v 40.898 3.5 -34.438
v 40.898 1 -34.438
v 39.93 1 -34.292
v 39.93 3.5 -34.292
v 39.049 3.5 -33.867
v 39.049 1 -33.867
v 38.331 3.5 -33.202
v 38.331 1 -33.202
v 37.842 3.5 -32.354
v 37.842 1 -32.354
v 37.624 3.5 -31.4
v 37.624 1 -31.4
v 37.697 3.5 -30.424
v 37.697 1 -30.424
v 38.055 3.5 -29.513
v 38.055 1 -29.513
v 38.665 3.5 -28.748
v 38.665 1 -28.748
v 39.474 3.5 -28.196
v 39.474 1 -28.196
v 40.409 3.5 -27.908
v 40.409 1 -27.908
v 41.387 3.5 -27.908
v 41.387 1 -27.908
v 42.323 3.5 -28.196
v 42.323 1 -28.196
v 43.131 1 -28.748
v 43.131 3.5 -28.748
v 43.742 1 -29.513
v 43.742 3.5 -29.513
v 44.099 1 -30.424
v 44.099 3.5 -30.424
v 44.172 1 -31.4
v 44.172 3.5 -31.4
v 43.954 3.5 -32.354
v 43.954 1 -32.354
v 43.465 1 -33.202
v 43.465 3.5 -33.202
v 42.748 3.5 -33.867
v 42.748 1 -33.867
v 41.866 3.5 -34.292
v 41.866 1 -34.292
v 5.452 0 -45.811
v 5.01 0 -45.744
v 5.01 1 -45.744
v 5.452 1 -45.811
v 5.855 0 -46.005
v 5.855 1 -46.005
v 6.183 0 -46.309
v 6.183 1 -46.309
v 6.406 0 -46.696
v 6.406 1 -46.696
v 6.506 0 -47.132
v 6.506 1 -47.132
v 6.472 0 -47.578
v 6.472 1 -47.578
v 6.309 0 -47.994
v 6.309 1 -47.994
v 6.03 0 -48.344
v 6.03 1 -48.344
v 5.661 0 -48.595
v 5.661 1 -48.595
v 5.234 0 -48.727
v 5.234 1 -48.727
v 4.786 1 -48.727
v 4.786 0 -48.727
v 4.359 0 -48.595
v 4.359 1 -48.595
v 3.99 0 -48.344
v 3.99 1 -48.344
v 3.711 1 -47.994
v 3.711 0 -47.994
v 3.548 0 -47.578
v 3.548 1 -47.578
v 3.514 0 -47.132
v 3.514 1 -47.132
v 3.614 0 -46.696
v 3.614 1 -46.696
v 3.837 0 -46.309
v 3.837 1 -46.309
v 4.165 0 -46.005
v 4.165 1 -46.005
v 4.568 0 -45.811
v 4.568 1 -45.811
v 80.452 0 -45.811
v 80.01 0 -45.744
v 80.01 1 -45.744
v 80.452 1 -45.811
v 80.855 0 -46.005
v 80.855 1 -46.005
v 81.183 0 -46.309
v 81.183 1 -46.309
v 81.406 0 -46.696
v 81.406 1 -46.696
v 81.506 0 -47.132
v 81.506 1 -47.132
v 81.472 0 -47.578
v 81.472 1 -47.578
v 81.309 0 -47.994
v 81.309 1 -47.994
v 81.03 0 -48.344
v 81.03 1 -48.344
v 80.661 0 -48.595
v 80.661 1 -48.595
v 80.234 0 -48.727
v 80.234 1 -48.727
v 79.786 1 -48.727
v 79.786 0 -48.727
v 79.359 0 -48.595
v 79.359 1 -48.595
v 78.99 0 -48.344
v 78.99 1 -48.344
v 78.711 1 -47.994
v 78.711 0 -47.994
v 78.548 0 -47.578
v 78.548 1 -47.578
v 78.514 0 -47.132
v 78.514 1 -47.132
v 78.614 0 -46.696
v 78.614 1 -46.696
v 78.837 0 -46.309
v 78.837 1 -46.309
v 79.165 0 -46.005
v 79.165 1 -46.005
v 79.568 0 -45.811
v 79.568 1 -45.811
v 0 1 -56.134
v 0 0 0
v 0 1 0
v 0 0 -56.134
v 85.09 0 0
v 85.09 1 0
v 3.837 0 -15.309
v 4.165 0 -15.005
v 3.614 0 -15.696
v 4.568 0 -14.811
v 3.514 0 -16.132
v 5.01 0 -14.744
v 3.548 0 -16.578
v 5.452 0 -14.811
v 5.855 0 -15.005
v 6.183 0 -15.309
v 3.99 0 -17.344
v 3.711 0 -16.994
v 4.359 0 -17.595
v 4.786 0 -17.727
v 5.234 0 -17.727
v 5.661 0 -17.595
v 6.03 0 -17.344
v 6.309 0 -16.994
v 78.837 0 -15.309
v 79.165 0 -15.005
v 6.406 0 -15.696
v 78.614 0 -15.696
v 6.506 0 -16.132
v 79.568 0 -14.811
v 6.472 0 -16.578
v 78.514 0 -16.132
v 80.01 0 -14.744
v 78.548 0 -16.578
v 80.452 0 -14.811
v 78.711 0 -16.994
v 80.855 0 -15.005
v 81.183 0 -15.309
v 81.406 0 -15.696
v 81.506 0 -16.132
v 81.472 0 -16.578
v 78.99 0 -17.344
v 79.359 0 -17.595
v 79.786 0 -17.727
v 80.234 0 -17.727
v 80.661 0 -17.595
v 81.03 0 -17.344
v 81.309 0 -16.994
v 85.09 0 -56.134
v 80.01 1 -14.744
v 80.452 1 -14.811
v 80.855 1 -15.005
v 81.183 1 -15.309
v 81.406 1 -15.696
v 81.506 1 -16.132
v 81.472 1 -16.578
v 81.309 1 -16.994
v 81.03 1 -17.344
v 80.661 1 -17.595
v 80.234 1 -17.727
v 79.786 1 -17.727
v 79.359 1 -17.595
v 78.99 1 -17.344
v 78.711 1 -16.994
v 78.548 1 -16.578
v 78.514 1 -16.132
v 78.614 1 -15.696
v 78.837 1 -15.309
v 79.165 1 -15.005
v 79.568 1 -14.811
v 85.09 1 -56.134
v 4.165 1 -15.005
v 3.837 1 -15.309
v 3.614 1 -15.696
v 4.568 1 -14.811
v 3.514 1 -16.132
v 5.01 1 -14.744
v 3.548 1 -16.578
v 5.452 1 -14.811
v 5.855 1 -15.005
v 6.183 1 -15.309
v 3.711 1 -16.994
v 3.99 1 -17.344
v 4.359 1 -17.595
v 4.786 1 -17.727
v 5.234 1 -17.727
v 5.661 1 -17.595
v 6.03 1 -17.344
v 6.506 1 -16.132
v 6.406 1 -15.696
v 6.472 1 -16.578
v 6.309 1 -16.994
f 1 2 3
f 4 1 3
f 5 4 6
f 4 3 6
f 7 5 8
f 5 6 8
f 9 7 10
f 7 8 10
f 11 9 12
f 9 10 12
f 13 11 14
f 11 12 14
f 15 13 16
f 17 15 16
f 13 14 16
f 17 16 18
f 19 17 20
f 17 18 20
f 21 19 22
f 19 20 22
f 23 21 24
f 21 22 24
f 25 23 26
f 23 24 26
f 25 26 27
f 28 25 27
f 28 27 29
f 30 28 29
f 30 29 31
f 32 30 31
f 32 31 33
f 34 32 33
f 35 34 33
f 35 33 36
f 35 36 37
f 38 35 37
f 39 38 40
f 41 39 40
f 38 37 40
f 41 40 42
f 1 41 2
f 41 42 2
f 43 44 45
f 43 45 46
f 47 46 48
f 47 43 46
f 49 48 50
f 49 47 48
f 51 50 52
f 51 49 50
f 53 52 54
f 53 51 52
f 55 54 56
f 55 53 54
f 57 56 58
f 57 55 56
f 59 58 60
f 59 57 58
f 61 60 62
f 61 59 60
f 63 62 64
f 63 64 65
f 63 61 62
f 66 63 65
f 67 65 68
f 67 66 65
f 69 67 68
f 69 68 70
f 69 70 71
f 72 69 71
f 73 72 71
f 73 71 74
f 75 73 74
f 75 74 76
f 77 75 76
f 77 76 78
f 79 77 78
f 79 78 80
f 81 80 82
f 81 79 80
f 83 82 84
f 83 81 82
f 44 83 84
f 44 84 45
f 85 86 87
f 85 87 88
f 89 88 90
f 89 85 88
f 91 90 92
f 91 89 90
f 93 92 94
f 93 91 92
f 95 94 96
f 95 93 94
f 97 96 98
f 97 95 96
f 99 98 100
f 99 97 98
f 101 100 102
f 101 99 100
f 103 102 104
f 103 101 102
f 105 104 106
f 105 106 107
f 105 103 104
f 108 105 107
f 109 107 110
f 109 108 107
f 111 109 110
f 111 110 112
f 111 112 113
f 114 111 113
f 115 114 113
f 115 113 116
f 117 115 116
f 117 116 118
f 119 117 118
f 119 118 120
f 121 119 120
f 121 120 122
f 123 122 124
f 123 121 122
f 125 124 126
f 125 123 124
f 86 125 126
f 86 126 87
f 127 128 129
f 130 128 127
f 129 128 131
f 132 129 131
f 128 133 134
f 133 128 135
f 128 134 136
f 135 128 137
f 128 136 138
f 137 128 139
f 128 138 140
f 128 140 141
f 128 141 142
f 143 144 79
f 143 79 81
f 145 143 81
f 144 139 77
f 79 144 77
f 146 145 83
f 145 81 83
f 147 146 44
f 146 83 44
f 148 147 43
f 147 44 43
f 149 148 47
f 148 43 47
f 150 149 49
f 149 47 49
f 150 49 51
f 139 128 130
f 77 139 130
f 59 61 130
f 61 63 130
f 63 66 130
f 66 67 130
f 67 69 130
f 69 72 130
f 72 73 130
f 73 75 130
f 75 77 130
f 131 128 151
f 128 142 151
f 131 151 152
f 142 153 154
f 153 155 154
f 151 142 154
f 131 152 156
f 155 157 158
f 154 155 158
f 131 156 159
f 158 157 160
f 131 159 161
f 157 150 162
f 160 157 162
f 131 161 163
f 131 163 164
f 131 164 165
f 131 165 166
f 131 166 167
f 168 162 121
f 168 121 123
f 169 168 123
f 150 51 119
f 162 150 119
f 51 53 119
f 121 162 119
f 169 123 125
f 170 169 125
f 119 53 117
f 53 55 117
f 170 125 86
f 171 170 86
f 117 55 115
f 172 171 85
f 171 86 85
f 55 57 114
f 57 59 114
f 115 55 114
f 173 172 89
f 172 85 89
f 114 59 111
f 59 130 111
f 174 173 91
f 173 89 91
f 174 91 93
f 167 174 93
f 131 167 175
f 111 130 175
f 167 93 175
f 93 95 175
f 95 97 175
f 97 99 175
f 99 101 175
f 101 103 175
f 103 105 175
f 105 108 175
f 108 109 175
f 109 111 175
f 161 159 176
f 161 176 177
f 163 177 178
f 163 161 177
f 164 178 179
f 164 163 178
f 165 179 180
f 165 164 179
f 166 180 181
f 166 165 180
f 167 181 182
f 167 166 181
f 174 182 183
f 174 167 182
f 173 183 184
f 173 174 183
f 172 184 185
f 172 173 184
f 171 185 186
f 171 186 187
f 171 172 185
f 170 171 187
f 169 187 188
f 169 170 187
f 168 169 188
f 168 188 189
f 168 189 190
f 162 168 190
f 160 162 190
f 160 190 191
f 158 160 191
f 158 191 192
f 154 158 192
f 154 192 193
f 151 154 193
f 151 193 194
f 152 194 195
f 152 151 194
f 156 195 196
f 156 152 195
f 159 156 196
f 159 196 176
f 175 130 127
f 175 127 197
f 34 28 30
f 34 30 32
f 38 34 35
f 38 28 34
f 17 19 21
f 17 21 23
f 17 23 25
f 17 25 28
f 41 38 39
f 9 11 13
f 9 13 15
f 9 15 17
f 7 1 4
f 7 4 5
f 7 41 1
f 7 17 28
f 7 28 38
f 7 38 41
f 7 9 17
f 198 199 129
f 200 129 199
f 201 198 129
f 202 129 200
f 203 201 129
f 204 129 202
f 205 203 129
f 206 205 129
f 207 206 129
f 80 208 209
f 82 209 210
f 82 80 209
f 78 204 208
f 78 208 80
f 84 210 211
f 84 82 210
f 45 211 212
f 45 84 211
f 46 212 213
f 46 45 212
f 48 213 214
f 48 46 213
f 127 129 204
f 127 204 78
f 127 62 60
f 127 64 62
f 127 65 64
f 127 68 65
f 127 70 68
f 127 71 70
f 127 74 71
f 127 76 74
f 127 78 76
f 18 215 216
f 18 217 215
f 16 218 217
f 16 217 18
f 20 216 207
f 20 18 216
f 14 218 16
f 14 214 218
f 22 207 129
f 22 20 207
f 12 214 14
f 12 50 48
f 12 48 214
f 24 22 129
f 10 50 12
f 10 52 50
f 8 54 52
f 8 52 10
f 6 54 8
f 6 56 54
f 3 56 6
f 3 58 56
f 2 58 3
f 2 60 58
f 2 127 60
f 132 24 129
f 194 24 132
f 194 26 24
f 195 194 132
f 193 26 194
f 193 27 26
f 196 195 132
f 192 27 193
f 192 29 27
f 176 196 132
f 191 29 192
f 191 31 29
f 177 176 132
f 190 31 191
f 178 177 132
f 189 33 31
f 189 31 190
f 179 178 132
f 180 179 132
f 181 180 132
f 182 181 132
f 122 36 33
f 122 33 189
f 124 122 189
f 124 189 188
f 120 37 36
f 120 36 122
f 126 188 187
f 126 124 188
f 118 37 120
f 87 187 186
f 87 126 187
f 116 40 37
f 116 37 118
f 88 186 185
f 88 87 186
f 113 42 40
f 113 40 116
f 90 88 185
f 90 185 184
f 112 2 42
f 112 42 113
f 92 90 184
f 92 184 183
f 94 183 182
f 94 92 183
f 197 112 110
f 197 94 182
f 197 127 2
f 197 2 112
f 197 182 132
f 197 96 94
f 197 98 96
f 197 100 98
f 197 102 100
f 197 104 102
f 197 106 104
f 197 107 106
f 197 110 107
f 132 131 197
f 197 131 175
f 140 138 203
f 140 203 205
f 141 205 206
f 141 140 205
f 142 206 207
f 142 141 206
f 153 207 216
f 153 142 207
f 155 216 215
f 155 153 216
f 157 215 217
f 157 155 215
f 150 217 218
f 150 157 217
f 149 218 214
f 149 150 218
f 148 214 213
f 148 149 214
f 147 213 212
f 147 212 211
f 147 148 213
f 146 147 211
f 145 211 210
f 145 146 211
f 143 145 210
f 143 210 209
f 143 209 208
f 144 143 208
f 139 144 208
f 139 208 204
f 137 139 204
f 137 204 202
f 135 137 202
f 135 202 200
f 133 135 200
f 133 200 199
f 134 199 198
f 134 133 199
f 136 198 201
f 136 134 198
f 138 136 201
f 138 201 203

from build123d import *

# Parameters (mm, degrees)
SKETCH1_W           = 85.09
SKETCH1_H           = 56.134
SKETCH1_R           = 1.5
BOSS_EXTRUDE1_DEPTH = 1
SKETCH2_R           = 3.283223987
BOSS_EXTRUDE2_DEPTH = 2.5


with BuildPart() as part:
    # Sketch1 → Boss-Extrude1 (new body)
    with BuildSketch(Plane(origin=(0, 0, 0), x_dir=(1, 0, 0), z_dir=(0, 1, 0))):
        with Locations((42.545, 28.067)):
            Rectangle(SKETCH1_W, SKETCH1_H)
        with Locations(Location((5.01, 47.244, 0), (0, 0, 270))):
            Circle(SKETCH1_R, mode=Mode.SUBTRACT)
        with Locations(Location((80.01, 47.244, 0), (0, 0, 270))):
            Circle(SKETCH1_R, mode=Mode.SUBTRACT)
        with Locations(Location((5.01, 16.244, 0), (0, 0, 270))):
            Circle(SKETCH1_R, mode=Mode.SUBTRACT)
        with Locations(Location((80.01, 16.244, 0), (0, 0, 270))):
            Circle(SKETCH1_R, mode=Mode.SUBTRACT)
    extrude(amount=BOSS_EXTRUDE1_DEPTH)

    # Sketch2 → Boss-Extrude2 (add)
    with BuildSketch(Plane(origin=(0, 1, 0), x_dir=(1, 0, 0), z_dir=(0, 1, 0))):
        with Locations(Location((40.898145706, 31.154537448, 0), (0, 0, 90))):
            Circle(SKETCH2_R)
    extrude(amount=BOSS_EXTRUDE2_DEPTH)


solid = part.part
